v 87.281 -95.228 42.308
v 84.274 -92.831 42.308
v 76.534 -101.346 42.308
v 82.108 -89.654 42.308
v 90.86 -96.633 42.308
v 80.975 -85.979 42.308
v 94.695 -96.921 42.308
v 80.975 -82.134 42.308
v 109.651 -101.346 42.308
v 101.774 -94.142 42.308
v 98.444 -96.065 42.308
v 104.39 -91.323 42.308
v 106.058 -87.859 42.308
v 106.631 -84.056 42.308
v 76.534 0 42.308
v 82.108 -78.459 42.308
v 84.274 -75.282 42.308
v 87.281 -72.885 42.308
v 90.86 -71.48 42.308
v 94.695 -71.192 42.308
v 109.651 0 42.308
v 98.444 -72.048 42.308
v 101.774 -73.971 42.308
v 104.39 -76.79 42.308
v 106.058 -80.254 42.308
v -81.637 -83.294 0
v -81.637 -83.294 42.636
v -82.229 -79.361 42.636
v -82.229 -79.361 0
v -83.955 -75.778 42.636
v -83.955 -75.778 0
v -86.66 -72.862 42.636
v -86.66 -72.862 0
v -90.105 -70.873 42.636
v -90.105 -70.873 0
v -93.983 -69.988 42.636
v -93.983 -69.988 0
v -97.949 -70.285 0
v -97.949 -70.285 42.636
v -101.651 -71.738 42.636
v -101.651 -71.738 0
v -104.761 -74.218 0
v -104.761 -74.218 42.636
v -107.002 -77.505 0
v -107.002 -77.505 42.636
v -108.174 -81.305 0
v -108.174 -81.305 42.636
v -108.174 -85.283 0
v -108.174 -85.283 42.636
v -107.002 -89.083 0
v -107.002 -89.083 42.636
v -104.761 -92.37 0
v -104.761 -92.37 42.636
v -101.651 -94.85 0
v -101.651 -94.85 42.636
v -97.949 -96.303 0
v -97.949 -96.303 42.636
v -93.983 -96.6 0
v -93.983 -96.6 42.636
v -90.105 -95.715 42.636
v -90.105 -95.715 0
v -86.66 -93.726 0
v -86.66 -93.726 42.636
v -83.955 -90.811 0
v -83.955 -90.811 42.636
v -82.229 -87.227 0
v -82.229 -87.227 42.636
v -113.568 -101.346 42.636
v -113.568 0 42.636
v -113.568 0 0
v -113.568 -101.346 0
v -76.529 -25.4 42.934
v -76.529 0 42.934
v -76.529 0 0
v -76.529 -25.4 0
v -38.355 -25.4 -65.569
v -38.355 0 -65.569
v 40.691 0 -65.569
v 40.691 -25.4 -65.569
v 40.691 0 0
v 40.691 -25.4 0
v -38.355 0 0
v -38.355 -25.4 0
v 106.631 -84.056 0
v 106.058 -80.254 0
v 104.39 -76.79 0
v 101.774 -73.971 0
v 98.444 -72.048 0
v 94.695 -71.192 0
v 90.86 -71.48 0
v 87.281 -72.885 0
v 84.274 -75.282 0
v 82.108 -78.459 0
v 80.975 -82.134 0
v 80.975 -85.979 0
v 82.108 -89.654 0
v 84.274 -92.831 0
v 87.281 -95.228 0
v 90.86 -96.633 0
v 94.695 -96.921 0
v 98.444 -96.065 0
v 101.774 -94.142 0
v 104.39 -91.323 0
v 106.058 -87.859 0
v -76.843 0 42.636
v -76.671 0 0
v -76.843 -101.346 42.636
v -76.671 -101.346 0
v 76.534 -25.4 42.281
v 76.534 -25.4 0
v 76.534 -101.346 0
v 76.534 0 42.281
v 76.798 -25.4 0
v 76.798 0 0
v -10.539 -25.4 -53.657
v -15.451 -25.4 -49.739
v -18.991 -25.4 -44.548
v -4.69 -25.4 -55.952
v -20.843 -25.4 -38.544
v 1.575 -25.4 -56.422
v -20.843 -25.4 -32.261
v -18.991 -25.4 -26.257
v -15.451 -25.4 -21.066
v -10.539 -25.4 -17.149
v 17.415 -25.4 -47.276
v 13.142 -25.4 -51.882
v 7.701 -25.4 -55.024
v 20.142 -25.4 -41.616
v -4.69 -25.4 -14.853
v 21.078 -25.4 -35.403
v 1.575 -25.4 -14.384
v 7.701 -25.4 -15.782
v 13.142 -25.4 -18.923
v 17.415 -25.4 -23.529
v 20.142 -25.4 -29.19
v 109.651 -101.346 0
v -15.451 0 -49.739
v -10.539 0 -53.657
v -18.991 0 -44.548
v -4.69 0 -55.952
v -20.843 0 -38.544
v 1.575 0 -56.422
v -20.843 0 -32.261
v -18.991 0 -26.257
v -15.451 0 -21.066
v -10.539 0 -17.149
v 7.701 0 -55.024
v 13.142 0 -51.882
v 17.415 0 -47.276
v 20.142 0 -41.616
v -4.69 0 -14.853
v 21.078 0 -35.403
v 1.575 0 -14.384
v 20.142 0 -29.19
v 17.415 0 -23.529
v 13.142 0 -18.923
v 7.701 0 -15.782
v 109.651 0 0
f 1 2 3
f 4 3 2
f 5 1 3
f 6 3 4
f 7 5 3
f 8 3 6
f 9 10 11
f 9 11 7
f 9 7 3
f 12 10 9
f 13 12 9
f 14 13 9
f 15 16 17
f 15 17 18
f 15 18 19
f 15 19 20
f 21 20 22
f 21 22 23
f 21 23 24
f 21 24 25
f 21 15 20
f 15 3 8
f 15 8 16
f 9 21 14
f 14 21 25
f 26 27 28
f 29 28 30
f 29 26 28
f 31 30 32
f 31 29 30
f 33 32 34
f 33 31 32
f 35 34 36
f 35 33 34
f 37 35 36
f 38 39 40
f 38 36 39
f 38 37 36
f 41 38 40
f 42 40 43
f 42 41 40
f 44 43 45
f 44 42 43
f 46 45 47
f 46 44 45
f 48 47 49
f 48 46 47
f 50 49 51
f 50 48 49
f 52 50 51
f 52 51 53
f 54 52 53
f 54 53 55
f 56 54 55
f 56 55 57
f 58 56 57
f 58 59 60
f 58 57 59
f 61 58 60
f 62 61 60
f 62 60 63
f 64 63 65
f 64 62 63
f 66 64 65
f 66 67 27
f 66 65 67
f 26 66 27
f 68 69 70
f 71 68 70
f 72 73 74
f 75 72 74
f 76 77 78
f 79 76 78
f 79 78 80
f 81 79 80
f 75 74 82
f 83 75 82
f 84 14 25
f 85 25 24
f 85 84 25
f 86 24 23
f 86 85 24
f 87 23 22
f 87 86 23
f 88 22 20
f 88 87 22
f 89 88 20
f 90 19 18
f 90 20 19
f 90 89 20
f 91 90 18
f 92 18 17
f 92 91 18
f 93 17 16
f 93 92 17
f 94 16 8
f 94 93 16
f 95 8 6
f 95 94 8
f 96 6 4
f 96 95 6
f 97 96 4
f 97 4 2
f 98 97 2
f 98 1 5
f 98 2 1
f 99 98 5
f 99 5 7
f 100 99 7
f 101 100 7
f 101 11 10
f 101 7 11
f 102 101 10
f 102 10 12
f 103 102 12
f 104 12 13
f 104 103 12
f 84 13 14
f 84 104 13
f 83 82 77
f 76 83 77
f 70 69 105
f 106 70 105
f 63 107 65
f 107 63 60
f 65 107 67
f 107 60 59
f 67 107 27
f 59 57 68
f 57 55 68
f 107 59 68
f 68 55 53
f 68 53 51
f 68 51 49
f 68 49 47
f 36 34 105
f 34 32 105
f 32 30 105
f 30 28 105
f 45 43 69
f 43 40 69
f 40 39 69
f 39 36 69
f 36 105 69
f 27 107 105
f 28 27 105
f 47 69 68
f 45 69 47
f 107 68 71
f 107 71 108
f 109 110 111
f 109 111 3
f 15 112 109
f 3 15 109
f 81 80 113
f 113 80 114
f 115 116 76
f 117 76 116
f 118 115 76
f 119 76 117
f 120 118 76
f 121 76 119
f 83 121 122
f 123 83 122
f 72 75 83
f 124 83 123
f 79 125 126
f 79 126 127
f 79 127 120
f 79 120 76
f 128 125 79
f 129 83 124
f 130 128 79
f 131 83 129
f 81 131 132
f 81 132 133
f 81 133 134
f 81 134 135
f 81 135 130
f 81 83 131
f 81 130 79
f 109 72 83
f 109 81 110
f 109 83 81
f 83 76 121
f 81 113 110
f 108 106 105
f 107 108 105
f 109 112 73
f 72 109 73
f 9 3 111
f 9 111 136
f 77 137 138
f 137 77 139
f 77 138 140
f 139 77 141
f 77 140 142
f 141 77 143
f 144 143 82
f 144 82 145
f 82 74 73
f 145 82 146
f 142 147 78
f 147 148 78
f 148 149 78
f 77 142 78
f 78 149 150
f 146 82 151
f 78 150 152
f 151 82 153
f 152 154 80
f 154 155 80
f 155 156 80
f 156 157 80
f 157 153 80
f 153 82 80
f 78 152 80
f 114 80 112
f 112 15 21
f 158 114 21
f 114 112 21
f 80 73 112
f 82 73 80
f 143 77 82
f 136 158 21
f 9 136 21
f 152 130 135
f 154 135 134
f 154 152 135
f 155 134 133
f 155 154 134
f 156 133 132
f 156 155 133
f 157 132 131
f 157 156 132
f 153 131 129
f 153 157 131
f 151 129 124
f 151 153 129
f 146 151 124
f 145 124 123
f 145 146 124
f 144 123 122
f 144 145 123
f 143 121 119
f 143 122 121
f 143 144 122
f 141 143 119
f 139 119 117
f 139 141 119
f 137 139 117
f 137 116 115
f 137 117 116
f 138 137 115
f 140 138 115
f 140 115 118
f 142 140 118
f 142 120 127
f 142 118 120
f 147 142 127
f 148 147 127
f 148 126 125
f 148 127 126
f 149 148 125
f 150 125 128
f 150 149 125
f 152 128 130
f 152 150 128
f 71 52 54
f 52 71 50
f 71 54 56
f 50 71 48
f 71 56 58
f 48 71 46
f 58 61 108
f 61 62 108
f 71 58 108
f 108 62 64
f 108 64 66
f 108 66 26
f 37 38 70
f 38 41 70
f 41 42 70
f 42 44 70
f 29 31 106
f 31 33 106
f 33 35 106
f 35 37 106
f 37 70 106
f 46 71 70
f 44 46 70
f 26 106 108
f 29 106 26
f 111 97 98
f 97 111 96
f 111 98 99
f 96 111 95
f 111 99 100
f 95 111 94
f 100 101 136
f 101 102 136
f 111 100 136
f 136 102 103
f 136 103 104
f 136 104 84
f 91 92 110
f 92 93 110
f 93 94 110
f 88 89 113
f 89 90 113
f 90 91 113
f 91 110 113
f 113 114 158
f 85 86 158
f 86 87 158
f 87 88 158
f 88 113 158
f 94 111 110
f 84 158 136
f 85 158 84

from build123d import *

# Parameters (mm, degrees)
F1_DEPTH = 25.4
F2_W     = 33.117227
F2_H     = 42.308025
F3_DEPTH = 101.346
F4_R     = 13.343181
F4_R_2   = 12.900124
F5_DEPTH = 128.27
F6_R     = 21.077997
F7_DEPTH = 62.738


with BuildPart() as f1:
    # F0 (on Front) → F1 (new body)
    with BuildSketch(Plane.XZ):
        Polygon((-38.354874, 0), (-38.354874, -65.568864), (40.691458, -65.568864), (40.691458, 0), (76.798312, 0), (76.798312, 42.279813), (-76.529235, 42.933661), (-76.529235, 0), align=None)
    extrude(amount=F1_DEPTH)

    # F2 (on Front) → F3 (join)
    with BuildSketch(Plane.XZ):
        with Locations((93.092281, 21.154013)):
            Rectangle(F2_W, F2_H)
        Polygon((-76.670997, 0), (-76.84296, 42.635918), (-113.568336, 42.635918), (-113.568336, 0), align=None)
    extrude(amount=F3_DEPTH)

    # F4 (on Top) → F5 (cut)
    with BuildSketch(Plane.XY):
        with Locations((-94.979756, -83.294027)):
            Circle(F4_R)
        with Locations((93.730949, -84.056497)):
            Circle(F4_R_2)
    extrude(amount=F5_DEPTH, mode=Mode.SUBTRACT)

    # F6 (on Front) → F7 (cut)
    with BuildSketch(Plane.XZ):
        with Locations((0, -35.402682)):
            Circle(F6_R)
    extrude(amount=F7_DEPTH, mode=Mode.SUBTRACT)


solid = f1.part
